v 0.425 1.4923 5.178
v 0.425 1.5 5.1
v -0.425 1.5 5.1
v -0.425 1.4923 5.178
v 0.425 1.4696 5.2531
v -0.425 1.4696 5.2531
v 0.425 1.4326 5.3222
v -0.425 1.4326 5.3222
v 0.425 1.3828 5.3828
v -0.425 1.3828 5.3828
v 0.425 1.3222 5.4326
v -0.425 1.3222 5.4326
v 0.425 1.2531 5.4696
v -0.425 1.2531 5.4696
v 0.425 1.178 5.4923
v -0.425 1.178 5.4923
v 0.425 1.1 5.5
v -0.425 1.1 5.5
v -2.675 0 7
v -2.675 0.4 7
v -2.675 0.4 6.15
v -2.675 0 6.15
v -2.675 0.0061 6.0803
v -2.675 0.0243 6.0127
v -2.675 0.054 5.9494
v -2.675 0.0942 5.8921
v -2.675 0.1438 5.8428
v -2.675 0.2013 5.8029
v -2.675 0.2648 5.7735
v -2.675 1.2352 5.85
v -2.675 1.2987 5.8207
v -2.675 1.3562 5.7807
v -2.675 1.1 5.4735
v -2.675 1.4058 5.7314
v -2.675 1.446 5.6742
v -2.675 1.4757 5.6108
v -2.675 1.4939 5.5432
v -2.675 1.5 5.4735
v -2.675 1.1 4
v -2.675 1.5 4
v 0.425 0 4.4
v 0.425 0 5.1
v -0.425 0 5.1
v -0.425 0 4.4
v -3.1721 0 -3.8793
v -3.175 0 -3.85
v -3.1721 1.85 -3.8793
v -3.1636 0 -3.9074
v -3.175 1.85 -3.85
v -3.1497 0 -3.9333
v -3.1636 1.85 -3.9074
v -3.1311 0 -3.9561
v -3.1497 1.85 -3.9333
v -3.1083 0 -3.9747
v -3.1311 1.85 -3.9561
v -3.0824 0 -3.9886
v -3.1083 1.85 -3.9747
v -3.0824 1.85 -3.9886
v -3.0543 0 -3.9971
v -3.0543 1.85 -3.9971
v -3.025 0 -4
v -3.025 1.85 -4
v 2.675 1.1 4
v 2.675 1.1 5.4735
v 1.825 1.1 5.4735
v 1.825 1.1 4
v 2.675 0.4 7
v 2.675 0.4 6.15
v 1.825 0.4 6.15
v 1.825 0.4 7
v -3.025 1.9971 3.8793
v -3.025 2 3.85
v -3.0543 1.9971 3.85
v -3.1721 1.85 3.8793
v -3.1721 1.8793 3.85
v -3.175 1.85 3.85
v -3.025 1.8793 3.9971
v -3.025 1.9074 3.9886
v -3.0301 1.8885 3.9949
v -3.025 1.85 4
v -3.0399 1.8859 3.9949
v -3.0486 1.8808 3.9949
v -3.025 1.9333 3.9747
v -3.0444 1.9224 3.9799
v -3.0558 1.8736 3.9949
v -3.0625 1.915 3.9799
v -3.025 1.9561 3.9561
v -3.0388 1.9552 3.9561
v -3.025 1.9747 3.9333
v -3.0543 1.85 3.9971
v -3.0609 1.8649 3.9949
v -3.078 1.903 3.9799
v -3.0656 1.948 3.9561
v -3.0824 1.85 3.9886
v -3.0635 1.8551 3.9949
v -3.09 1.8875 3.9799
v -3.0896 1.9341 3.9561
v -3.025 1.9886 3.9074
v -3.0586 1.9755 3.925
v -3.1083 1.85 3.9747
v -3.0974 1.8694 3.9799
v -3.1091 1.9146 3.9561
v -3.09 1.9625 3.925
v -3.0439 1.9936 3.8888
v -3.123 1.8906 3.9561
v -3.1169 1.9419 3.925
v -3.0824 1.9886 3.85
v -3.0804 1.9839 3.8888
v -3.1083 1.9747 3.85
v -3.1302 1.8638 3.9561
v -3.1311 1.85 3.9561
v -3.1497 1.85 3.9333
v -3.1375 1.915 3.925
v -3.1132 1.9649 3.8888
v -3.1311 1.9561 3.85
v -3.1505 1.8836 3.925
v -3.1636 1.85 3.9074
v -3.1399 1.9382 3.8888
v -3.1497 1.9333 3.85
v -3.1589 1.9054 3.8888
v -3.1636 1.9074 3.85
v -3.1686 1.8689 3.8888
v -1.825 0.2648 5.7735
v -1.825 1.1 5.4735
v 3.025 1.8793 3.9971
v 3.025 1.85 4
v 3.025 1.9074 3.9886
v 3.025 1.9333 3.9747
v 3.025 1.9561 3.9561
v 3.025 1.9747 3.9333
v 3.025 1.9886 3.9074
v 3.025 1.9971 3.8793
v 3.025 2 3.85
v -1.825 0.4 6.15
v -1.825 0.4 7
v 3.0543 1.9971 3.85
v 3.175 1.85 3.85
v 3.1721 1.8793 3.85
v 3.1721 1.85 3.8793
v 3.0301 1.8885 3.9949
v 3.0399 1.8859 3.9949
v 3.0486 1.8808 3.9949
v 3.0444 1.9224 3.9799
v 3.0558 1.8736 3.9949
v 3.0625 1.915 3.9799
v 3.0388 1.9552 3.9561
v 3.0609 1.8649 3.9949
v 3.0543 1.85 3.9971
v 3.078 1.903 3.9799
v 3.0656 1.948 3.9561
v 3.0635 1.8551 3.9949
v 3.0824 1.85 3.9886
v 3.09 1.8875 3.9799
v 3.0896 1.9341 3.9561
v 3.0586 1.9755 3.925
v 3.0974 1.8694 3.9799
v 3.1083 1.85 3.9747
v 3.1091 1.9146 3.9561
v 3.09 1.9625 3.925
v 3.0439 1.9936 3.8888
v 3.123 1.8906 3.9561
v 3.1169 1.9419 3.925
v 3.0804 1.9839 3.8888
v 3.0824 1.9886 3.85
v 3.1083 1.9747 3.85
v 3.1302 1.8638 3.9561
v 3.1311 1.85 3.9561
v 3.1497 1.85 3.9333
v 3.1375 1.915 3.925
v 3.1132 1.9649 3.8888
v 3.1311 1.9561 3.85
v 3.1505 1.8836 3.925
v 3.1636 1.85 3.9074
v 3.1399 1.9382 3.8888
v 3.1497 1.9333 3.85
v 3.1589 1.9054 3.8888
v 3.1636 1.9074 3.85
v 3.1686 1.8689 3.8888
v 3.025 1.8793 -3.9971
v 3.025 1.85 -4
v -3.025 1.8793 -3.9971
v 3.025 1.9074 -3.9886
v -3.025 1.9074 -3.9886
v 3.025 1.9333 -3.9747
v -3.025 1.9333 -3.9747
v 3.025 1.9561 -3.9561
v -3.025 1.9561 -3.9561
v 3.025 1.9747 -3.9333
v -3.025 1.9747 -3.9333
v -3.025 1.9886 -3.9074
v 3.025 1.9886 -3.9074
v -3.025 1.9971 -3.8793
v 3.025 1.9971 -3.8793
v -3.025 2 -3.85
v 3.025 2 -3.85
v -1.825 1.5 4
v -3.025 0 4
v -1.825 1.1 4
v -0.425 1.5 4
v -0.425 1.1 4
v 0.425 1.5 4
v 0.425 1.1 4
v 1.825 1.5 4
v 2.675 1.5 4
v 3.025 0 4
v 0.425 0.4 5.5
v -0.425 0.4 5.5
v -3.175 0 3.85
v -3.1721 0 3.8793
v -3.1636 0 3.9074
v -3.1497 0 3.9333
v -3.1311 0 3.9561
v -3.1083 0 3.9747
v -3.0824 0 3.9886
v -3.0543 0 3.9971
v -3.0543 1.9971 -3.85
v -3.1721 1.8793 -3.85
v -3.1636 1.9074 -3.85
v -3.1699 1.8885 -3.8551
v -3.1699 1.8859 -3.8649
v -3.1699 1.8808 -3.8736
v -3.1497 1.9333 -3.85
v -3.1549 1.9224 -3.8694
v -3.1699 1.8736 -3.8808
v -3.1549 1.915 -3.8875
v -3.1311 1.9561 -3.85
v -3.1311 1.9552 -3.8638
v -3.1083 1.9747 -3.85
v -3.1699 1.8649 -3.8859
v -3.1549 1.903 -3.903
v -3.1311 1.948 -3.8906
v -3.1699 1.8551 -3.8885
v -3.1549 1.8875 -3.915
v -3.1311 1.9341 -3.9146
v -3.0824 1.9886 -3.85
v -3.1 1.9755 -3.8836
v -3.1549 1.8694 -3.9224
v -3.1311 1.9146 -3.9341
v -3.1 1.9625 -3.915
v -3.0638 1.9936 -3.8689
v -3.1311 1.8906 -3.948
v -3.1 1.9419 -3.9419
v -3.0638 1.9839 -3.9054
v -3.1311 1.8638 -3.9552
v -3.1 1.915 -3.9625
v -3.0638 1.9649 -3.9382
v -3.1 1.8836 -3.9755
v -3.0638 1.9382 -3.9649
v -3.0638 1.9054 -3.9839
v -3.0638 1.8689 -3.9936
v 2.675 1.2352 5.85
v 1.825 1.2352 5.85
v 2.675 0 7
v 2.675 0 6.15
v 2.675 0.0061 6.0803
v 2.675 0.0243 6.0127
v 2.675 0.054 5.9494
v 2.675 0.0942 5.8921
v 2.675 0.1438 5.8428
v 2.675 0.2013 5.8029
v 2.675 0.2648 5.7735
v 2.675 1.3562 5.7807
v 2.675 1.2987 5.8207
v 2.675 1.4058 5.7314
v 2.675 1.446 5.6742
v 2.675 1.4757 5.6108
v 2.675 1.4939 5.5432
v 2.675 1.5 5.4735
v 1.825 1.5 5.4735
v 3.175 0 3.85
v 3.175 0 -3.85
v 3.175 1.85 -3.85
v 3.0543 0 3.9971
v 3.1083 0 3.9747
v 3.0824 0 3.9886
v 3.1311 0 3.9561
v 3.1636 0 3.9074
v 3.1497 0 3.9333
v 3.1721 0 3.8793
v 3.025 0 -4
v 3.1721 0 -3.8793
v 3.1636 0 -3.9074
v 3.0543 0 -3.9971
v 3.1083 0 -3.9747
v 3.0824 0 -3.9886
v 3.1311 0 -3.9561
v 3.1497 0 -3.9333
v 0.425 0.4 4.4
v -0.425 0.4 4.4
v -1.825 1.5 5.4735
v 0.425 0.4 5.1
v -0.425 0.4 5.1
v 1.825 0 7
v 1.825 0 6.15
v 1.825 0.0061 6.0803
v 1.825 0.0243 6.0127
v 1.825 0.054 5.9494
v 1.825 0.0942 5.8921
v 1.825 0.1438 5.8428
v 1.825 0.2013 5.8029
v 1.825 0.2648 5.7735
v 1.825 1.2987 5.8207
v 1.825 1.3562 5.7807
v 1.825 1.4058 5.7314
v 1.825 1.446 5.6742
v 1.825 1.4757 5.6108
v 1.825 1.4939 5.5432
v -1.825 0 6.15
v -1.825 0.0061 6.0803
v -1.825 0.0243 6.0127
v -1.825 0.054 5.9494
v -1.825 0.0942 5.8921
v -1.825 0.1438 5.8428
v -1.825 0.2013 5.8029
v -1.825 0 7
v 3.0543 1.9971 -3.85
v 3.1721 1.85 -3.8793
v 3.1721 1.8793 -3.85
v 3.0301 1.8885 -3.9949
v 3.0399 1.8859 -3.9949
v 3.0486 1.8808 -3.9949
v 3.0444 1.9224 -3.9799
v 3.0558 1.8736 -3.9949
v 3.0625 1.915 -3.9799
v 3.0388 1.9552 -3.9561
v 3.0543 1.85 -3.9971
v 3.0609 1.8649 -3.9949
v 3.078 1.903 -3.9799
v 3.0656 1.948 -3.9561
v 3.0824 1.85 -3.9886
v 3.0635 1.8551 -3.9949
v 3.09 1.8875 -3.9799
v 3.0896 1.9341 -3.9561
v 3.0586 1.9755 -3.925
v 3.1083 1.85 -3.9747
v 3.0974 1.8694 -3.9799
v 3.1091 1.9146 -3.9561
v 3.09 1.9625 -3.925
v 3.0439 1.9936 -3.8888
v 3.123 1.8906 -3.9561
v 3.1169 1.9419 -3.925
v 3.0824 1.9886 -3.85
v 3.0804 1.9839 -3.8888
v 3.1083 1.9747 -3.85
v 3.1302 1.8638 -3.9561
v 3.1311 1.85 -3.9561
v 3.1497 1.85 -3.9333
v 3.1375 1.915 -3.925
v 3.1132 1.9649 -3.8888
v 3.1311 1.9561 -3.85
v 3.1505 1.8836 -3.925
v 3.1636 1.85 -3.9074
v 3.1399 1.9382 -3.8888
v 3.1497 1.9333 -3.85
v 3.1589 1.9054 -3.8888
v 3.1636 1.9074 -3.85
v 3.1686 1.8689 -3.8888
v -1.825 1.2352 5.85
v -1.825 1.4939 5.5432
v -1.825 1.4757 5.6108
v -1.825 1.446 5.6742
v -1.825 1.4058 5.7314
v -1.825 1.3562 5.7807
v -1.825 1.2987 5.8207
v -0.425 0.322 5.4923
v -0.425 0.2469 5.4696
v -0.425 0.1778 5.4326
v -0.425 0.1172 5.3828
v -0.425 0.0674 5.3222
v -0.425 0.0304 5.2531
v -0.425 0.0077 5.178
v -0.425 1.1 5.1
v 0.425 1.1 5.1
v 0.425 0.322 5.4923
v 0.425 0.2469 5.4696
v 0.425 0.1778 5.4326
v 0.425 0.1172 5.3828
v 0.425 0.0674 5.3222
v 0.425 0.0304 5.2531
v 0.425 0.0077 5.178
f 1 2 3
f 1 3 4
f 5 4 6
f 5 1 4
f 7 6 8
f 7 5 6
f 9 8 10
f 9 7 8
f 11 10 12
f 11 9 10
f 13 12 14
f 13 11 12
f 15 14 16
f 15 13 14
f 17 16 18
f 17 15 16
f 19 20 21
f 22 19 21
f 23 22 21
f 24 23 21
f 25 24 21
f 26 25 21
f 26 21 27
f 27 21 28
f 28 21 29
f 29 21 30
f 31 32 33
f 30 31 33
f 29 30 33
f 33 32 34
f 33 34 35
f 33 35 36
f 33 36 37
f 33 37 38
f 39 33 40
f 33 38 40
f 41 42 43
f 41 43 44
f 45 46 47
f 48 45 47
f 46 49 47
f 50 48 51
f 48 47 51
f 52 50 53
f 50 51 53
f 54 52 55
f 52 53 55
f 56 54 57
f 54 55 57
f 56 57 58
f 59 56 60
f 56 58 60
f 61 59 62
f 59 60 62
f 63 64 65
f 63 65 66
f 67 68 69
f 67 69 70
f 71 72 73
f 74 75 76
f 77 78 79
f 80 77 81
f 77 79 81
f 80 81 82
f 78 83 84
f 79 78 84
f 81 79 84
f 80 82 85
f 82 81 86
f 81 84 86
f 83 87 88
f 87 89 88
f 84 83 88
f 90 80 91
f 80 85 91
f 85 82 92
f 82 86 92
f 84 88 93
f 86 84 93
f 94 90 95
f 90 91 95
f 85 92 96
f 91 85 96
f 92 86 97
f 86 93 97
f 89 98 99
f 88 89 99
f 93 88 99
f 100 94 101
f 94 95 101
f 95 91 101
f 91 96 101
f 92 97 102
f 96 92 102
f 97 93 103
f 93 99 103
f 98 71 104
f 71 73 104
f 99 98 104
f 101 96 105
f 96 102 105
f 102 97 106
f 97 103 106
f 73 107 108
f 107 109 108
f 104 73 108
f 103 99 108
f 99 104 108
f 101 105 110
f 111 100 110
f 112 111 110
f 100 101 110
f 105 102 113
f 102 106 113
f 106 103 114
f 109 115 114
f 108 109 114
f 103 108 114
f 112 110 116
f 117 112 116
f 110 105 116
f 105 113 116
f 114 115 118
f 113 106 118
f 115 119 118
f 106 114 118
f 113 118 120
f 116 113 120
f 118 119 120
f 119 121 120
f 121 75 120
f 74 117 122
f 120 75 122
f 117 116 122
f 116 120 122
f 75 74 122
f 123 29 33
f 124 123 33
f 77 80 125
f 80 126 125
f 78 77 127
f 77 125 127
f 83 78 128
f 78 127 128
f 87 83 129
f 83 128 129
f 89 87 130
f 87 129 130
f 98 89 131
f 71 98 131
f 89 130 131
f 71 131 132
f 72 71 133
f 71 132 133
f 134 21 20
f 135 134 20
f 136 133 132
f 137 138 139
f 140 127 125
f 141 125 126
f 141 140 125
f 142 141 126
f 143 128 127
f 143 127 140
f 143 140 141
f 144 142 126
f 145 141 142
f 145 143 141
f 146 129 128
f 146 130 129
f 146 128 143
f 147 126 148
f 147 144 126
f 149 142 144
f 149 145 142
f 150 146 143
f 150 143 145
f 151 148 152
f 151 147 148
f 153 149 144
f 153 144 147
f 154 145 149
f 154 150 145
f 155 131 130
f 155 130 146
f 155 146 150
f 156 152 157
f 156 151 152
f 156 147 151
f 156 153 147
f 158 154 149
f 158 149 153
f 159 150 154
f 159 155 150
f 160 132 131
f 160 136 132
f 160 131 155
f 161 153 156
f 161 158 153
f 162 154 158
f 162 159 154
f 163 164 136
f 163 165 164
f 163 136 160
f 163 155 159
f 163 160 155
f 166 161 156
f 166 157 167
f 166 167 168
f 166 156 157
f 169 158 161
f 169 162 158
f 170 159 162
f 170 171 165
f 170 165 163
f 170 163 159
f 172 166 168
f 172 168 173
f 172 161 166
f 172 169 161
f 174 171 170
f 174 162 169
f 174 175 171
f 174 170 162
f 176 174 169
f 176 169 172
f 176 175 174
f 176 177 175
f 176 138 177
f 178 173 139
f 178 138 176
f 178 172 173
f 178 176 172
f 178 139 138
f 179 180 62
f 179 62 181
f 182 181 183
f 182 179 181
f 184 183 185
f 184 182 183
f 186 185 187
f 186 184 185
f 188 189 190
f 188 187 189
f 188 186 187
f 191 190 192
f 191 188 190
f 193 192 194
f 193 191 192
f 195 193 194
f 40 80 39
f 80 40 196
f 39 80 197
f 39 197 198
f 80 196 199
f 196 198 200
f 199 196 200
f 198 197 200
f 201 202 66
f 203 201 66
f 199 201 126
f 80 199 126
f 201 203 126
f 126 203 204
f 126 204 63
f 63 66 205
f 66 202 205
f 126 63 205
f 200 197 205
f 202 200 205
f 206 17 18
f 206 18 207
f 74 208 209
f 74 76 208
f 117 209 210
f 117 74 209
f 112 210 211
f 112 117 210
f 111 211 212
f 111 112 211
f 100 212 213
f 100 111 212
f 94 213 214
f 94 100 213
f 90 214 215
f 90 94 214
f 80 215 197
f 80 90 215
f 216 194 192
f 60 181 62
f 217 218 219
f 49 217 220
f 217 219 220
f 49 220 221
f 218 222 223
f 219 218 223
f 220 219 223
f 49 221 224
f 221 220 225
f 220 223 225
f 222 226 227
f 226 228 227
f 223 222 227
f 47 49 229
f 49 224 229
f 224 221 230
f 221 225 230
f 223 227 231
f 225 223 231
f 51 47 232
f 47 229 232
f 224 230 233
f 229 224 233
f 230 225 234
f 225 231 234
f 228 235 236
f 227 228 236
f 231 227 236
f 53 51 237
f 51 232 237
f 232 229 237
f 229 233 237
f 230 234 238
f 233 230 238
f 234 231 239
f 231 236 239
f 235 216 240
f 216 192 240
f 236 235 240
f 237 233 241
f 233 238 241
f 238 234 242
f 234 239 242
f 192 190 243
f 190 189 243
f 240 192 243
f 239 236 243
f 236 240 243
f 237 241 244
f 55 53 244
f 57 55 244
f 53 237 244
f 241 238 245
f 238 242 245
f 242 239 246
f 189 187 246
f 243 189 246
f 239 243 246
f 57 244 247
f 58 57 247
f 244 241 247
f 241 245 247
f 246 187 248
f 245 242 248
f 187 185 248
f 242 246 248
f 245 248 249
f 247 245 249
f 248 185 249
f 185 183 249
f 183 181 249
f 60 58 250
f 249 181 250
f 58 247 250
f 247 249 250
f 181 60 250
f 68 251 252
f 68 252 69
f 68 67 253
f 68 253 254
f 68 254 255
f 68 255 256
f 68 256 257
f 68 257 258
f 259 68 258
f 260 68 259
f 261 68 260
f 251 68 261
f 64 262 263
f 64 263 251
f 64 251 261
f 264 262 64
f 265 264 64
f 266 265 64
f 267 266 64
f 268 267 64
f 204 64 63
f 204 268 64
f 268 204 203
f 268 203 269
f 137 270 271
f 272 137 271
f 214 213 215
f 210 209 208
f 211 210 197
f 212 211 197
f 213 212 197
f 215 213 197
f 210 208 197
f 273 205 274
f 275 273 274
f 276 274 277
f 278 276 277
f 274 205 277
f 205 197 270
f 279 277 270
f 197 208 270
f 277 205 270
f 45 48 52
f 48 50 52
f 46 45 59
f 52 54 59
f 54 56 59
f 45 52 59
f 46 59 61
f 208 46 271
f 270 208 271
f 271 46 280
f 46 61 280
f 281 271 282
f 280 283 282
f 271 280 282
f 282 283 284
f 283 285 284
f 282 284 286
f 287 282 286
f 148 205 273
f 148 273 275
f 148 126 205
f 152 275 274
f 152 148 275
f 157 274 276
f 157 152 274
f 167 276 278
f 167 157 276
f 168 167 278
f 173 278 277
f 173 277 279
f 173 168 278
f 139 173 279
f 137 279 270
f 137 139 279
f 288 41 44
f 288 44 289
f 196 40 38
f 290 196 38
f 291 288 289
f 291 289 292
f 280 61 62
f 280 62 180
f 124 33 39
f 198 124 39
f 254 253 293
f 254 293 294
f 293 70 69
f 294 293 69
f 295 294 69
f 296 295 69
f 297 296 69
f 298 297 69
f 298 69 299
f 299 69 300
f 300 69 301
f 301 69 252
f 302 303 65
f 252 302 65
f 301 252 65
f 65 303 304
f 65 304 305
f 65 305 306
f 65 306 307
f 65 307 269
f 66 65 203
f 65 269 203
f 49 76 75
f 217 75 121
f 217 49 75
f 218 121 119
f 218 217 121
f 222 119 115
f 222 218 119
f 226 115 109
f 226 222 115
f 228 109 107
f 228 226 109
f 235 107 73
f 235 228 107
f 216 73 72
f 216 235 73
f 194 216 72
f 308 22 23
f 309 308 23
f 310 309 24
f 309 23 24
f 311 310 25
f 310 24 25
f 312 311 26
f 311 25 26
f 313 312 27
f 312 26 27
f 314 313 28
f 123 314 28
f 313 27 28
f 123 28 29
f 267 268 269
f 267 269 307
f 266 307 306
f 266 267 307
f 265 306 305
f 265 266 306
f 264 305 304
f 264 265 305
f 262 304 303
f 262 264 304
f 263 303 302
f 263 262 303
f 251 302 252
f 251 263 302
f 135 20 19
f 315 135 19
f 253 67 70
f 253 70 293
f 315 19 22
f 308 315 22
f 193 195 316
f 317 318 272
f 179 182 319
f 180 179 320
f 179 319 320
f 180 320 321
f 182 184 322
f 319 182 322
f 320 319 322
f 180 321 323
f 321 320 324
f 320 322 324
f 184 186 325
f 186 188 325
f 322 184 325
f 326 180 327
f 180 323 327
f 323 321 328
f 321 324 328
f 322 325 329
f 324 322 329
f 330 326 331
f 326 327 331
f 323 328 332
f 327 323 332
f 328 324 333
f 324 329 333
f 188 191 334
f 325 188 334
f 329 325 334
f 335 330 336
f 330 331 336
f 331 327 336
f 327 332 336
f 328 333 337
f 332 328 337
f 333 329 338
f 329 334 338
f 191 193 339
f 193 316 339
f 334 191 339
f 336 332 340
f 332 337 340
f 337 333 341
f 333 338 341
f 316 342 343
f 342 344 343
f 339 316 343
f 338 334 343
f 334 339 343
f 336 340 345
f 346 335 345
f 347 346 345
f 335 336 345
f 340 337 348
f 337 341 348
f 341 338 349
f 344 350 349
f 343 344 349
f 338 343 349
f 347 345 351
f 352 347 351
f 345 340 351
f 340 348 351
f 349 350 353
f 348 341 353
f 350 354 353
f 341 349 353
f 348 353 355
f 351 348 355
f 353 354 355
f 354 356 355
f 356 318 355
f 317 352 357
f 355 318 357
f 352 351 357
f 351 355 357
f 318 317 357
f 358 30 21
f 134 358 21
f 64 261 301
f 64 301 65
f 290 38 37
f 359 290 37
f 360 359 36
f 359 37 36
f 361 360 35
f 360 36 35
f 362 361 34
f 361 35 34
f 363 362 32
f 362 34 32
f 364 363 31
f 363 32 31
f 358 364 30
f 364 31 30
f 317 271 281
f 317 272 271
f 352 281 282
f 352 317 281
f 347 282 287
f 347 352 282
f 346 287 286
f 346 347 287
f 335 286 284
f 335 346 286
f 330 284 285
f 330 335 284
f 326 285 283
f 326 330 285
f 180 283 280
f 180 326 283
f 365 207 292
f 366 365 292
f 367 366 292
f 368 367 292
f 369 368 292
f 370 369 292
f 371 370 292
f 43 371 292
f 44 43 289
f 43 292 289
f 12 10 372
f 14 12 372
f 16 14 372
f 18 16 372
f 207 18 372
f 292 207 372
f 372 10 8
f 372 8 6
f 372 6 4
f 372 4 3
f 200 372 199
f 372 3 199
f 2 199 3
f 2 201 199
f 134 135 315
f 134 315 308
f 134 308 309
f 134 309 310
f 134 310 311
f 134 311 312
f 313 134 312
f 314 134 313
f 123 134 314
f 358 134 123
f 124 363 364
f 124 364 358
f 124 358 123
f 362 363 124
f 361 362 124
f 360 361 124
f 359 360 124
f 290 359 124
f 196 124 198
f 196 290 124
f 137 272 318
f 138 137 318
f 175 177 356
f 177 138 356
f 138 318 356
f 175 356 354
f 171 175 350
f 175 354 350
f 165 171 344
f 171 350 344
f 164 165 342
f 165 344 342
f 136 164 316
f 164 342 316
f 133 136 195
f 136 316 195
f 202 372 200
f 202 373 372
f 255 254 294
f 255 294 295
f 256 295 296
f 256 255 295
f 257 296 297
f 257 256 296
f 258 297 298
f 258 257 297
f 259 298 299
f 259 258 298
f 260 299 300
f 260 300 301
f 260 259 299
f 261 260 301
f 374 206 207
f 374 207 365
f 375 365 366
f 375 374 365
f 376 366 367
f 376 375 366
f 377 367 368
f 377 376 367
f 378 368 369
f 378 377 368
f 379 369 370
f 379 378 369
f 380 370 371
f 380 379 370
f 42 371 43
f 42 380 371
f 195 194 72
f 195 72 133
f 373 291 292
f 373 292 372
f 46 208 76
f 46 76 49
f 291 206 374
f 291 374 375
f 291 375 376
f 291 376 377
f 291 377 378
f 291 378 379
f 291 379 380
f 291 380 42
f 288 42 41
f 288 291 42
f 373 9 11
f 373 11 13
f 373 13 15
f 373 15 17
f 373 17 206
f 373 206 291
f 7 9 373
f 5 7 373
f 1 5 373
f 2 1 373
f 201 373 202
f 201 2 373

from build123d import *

# Parameters (mm, degrees)
SKETCH1_W           = 6.35
SKETCH1_H           = 8
BOSS_EXTRUDE1_DEPTH = 2
FILLET1_R           = 0.15
BOSS_EXTRUDE2_DEPTH = 0.425
BOSS_EXTRUDE3_START = -0.5
BOSS_EXTRUDE3_DEPTH = 0.85


with BuildPart() as part:
    # Sketch1 → Boss-Extrude1 (new body)
    with BuildSketch(Plane(origin=(0, 0, 0), x_dir=(1, 0, 0), z_dir=(0, 1, 0))):
        Rectangle(SKETCH1_W, SKETCH1_H)
    extrude(amount=BOSS_EXTRUDE1_DEPTH)

    # Fillet1
    fillet1_edges = [part.edges().sort_by_distance(p)[0] for p in [
        (3.175, 2, 0),
        (0, 2, -4),
        (-3.175, 2, 0),
        (0, 2, 4),
        (-3.175, 1, -4),
        (3.175, 1, -4),
        (3.175, 1, 4),
        (-3.175, 1, 4),
    ]]
    fillet(fillet1_edges, radius=FILLET1_R)

    # Sketch2 → Boss-Extrude2 (add, symmetric)
    with BuildSketch(Plane(origin=(0, 0, 0), x_dir=(0, 0, -1), z_dir=(1, 0, 0))):
        with BuildLine():
            Line((-4, 1.5), (-5.1, 1.5))
            ThreePointArc((-5.1, 1.5), (-5.382842712, 1.382842712), (-5.5, 1.1))
            Line((-5.5, 1.1), (-5.5, 0.4))
            ThreePointArc((-5.5, 0.4), (-5.382842712, 0.117157288), (-5.1, 0))
            Line((-5.1, 0), (-4.4, 0))
            Line((-4.4, 0), (-4.4, 0.4))
            Line((-4.4, 0.4), (-5.1, 0.4))
            Line((-5.1, 0.4), (-5.1, 1.1))
            Line((-5.1, 1.1), (-4, 1.1))
            Line((-4, 1.1), (-4, 1.5))
        make_face()
    extrude(amount=BOSS_EXTRUDE2_DEPTH, both=True)

    # Sketch3 → Boss-Extrude3 (add)
    with BuildSketch(Plane(origin=(3.175, 0, 0), x_dir=(0, 0, -1), z_dir=(1, 0, 0)).offset(BOSS_EXTRUDE3_START)):
        with BuildLine():
            Line((-4, 1.5), (-5.473547717, 1.5))
            ThreePointArc((-5.473547717, 1.5), (-5.703670661, 1.427174923), (-5.85, 1.235217152))
            Line((-5.85, 1.235217152), (-6.15, 0.4))
            Line((-6.15, 0.4), (-7, 0.4))
            Line((-7, 0.4), (-7, 0))
            Line((-7, 0), (-6.15, 0))
            ThreePointArc((-6.15, 0), (-5.919877056, 0.072825077), (-5.773547717, 0.264782848))
            Line((-5.773547717, 0.264782848), (-5.473547717, 1.1))
            Line((-5.473547717, 1.1), (-4, 1.1))
            Line((-4, 1.1), (-4, 1.5))
        make_face()
    boss_extrude3 = extrude(amount=-BOSS_EXTRUDE3_DEPTH)

    # Mirror1: Boss-Extrude3 across plane
    add(boss_extrude3.mirror(Plane(origin=(0, 0, 0), x_dir=(0, 0, 1), z_dir=(1, 0, 0))))


solid = part.part
